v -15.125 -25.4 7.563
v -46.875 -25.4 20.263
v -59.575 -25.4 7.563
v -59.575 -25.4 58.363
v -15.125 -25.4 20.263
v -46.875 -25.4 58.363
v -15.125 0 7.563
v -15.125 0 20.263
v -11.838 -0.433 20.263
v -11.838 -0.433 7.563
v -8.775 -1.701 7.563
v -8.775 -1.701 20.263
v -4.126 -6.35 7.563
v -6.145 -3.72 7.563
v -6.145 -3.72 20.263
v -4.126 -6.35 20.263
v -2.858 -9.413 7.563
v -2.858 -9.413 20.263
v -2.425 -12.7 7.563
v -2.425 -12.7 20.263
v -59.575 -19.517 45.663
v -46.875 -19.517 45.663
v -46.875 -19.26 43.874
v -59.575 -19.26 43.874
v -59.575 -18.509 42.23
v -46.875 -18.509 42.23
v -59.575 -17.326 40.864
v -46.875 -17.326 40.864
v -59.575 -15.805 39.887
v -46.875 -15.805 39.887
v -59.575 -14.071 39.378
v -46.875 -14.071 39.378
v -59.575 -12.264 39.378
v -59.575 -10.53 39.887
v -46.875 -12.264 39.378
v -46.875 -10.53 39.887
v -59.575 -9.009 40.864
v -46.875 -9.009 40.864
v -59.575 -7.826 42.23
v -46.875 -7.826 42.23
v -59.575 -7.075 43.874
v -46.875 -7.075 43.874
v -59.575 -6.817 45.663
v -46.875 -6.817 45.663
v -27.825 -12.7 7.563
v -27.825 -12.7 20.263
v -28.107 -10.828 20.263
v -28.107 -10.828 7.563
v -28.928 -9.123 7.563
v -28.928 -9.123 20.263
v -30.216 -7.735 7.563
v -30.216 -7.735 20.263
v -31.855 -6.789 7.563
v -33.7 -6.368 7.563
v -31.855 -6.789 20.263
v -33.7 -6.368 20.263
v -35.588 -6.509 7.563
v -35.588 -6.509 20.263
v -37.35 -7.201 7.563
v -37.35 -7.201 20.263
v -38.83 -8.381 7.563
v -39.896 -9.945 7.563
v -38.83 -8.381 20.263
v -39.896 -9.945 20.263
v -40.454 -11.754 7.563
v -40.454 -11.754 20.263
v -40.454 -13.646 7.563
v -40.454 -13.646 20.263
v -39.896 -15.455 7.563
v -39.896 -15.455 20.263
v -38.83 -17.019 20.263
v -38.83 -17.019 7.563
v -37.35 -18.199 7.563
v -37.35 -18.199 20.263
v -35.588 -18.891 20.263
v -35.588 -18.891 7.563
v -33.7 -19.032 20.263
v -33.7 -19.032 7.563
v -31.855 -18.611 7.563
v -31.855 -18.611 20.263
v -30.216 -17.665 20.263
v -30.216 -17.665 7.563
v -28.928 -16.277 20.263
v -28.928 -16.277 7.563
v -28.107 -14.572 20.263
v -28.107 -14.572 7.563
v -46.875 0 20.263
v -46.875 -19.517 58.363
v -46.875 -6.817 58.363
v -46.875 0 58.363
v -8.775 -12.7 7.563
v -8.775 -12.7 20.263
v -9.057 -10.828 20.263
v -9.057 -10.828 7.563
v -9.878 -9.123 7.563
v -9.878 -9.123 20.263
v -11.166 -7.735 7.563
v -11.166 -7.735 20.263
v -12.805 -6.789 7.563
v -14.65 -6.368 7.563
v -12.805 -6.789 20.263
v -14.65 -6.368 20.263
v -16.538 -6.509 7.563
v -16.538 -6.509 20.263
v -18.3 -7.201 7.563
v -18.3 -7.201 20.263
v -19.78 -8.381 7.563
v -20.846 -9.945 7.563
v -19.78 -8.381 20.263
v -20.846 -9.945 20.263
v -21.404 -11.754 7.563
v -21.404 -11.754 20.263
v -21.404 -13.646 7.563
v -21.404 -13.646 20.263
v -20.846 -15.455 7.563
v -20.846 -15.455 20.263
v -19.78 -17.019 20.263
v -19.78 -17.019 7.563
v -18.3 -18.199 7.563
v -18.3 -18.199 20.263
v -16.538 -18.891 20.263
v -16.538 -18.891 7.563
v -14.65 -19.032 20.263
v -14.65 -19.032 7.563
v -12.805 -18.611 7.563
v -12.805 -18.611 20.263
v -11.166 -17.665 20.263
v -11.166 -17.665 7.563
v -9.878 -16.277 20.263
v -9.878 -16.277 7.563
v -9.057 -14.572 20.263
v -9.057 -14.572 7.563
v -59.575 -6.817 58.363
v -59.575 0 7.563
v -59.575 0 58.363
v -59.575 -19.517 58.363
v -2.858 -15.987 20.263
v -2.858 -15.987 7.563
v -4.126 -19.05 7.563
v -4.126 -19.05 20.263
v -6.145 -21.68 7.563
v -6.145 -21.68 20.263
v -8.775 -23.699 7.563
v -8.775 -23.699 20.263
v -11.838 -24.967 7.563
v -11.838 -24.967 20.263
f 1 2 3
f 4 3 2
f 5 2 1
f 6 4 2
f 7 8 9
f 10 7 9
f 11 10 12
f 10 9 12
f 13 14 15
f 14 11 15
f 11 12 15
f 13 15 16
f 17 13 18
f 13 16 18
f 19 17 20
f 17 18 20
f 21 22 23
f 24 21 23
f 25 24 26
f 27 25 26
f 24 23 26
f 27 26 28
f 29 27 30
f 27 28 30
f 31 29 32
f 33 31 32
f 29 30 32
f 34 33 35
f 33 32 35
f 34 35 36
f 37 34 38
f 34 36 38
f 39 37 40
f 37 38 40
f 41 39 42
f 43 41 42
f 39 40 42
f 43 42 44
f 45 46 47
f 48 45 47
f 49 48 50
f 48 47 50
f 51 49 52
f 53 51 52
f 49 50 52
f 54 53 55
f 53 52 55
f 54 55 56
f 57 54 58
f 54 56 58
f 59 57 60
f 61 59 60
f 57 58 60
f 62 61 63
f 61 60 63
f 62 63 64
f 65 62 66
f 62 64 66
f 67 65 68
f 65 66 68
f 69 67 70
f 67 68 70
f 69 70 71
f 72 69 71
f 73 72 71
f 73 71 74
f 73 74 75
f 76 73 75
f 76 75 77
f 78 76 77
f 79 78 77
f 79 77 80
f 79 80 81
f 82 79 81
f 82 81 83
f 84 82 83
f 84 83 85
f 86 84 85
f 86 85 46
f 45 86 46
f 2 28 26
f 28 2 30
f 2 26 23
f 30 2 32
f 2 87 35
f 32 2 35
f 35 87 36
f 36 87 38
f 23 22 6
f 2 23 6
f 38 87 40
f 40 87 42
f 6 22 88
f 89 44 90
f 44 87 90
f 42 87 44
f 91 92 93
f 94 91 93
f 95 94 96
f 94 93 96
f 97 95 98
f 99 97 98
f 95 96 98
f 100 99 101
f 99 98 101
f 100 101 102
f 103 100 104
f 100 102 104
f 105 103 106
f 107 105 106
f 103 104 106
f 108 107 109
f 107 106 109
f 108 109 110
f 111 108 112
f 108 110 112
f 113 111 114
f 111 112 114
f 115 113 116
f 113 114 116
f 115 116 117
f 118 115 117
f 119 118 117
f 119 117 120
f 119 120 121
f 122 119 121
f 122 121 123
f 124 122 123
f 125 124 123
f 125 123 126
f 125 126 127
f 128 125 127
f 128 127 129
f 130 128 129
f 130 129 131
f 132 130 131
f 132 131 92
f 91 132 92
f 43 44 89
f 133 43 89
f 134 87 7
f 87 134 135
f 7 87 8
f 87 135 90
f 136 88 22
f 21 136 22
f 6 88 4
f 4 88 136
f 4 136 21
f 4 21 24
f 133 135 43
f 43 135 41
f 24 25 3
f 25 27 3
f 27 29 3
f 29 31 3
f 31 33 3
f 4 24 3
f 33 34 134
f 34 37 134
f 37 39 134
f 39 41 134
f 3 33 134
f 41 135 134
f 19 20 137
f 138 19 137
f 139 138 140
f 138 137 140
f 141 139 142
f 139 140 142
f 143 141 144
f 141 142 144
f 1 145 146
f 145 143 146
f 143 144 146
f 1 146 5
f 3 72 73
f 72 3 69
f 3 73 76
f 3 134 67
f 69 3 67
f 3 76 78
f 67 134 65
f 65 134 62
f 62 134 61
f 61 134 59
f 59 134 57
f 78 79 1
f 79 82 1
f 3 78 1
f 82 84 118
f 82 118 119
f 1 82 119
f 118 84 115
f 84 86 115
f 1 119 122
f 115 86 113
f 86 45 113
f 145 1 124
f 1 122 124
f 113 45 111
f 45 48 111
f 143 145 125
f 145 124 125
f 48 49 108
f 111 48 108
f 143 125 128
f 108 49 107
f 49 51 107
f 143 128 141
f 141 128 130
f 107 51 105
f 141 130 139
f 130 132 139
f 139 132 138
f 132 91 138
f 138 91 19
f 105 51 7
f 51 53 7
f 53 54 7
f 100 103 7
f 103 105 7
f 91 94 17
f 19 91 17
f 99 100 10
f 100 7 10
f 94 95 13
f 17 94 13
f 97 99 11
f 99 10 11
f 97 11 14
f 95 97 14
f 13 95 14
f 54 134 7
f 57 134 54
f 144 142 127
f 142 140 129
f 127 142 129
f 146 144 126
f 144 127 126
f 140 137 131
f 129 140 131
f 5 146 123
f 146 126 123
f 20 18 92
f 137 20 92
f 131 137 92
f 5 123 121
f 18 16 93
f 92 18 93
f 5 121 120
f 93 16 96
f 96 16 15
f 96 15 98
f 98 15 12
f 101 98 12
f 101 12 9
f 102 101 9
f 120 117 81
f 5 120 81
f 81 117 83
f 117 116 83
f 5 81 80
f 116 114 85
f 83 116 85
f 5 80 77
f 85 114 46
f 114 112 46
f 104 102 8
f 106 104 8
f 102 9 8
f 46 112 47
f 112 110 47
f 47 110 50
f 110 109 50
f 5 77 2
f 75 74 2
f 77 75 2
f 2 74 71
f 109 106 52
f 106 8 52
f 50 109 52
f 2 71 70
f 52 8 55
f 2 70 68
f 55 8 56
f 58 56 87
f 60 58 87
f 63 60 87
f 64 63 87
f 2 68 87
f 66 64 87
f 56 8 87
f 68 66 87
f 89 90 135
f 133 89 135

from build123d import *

# Parameters (mm, degrees)
F1_DEPTH = 25.4
F2_R     = 6.35
F3_DEPTH = 25.4
F6_DEPTH = 25.4


with BuildPart() as f1:
    # F0 (on Front) → F1 (new body)
    with BuildSketch(Plane.XZ):
        Polygon((-46.874787, 58.363431), (-59.574787, 58.363431), (-59.574787, 7.563431), (-2.424787, 7.563431), (-2.424787, 20.263431), (-46.874787, 20.263431), align=None)
    extrude(amount=F1_DEPTH)

    # F2 (on face) → F3 (cut)
    with BuildSketch(Plane.XY.offset(20.263431)):
        with Locations((-34.174787, -12.7)):
            Circle(F2_R)
        with Locations((-15.124787, -12.7)):
            Circle(F2_R)
        with BuildLine():
            ThreePointArc((-15.124787, 0), (-6.14453, -3.719744), (-2.424787, -12.7))
            Line((-2.424787, -12.7), (-2.424787, 0))
            Line((-2.424787, 0), (-15.124787, 0))
        make_face()
        with BuildLine():
            ThreePointArc((-2.424787, -12.7), (-6.14453, -21.680256), (-15.124787, -25.4))
            Line((-15.124787, -25.4), (-2.424787, -25.4))
            Line((-2.424787, -25.4), (-2.424787, -12.7))
        make_face()
    extrude(amount=-F3_DEPTH, mode=Mode.SUBTRACT)

    # F4 (on face) → F6 (cut)
    with BuildSketch(Plane.YZ.offset(-46.874787)):
        with BuildLine():
            ThreePointArc((-19.517475, 45.663431), (-13.167475, 39.313431), (-6.817475, 45.663431))
            ThreePointArc((-6.817475, 45.663431), (-13.167475, 52.013431), (-19.517475, 45.663431))
        make_face()
        with BuildLine():
            ThreePointArc((-19.517475, 45.663431), (-13.167475, 52.013431), (-6.817475, 45.663431))
            Line((-6.817475, 45.663431), (-6.817475, 58.363431))
            Line((-6.817475, 58.363431), (-19.517475, 58.363431))
            Line((-19.517475, 58.363431), (-19.517475, 45.663431))
        make_face()
    extrude(amount=-F6_DEPTH, mode=Mode.SUBTRACT)


solid = f1.part
